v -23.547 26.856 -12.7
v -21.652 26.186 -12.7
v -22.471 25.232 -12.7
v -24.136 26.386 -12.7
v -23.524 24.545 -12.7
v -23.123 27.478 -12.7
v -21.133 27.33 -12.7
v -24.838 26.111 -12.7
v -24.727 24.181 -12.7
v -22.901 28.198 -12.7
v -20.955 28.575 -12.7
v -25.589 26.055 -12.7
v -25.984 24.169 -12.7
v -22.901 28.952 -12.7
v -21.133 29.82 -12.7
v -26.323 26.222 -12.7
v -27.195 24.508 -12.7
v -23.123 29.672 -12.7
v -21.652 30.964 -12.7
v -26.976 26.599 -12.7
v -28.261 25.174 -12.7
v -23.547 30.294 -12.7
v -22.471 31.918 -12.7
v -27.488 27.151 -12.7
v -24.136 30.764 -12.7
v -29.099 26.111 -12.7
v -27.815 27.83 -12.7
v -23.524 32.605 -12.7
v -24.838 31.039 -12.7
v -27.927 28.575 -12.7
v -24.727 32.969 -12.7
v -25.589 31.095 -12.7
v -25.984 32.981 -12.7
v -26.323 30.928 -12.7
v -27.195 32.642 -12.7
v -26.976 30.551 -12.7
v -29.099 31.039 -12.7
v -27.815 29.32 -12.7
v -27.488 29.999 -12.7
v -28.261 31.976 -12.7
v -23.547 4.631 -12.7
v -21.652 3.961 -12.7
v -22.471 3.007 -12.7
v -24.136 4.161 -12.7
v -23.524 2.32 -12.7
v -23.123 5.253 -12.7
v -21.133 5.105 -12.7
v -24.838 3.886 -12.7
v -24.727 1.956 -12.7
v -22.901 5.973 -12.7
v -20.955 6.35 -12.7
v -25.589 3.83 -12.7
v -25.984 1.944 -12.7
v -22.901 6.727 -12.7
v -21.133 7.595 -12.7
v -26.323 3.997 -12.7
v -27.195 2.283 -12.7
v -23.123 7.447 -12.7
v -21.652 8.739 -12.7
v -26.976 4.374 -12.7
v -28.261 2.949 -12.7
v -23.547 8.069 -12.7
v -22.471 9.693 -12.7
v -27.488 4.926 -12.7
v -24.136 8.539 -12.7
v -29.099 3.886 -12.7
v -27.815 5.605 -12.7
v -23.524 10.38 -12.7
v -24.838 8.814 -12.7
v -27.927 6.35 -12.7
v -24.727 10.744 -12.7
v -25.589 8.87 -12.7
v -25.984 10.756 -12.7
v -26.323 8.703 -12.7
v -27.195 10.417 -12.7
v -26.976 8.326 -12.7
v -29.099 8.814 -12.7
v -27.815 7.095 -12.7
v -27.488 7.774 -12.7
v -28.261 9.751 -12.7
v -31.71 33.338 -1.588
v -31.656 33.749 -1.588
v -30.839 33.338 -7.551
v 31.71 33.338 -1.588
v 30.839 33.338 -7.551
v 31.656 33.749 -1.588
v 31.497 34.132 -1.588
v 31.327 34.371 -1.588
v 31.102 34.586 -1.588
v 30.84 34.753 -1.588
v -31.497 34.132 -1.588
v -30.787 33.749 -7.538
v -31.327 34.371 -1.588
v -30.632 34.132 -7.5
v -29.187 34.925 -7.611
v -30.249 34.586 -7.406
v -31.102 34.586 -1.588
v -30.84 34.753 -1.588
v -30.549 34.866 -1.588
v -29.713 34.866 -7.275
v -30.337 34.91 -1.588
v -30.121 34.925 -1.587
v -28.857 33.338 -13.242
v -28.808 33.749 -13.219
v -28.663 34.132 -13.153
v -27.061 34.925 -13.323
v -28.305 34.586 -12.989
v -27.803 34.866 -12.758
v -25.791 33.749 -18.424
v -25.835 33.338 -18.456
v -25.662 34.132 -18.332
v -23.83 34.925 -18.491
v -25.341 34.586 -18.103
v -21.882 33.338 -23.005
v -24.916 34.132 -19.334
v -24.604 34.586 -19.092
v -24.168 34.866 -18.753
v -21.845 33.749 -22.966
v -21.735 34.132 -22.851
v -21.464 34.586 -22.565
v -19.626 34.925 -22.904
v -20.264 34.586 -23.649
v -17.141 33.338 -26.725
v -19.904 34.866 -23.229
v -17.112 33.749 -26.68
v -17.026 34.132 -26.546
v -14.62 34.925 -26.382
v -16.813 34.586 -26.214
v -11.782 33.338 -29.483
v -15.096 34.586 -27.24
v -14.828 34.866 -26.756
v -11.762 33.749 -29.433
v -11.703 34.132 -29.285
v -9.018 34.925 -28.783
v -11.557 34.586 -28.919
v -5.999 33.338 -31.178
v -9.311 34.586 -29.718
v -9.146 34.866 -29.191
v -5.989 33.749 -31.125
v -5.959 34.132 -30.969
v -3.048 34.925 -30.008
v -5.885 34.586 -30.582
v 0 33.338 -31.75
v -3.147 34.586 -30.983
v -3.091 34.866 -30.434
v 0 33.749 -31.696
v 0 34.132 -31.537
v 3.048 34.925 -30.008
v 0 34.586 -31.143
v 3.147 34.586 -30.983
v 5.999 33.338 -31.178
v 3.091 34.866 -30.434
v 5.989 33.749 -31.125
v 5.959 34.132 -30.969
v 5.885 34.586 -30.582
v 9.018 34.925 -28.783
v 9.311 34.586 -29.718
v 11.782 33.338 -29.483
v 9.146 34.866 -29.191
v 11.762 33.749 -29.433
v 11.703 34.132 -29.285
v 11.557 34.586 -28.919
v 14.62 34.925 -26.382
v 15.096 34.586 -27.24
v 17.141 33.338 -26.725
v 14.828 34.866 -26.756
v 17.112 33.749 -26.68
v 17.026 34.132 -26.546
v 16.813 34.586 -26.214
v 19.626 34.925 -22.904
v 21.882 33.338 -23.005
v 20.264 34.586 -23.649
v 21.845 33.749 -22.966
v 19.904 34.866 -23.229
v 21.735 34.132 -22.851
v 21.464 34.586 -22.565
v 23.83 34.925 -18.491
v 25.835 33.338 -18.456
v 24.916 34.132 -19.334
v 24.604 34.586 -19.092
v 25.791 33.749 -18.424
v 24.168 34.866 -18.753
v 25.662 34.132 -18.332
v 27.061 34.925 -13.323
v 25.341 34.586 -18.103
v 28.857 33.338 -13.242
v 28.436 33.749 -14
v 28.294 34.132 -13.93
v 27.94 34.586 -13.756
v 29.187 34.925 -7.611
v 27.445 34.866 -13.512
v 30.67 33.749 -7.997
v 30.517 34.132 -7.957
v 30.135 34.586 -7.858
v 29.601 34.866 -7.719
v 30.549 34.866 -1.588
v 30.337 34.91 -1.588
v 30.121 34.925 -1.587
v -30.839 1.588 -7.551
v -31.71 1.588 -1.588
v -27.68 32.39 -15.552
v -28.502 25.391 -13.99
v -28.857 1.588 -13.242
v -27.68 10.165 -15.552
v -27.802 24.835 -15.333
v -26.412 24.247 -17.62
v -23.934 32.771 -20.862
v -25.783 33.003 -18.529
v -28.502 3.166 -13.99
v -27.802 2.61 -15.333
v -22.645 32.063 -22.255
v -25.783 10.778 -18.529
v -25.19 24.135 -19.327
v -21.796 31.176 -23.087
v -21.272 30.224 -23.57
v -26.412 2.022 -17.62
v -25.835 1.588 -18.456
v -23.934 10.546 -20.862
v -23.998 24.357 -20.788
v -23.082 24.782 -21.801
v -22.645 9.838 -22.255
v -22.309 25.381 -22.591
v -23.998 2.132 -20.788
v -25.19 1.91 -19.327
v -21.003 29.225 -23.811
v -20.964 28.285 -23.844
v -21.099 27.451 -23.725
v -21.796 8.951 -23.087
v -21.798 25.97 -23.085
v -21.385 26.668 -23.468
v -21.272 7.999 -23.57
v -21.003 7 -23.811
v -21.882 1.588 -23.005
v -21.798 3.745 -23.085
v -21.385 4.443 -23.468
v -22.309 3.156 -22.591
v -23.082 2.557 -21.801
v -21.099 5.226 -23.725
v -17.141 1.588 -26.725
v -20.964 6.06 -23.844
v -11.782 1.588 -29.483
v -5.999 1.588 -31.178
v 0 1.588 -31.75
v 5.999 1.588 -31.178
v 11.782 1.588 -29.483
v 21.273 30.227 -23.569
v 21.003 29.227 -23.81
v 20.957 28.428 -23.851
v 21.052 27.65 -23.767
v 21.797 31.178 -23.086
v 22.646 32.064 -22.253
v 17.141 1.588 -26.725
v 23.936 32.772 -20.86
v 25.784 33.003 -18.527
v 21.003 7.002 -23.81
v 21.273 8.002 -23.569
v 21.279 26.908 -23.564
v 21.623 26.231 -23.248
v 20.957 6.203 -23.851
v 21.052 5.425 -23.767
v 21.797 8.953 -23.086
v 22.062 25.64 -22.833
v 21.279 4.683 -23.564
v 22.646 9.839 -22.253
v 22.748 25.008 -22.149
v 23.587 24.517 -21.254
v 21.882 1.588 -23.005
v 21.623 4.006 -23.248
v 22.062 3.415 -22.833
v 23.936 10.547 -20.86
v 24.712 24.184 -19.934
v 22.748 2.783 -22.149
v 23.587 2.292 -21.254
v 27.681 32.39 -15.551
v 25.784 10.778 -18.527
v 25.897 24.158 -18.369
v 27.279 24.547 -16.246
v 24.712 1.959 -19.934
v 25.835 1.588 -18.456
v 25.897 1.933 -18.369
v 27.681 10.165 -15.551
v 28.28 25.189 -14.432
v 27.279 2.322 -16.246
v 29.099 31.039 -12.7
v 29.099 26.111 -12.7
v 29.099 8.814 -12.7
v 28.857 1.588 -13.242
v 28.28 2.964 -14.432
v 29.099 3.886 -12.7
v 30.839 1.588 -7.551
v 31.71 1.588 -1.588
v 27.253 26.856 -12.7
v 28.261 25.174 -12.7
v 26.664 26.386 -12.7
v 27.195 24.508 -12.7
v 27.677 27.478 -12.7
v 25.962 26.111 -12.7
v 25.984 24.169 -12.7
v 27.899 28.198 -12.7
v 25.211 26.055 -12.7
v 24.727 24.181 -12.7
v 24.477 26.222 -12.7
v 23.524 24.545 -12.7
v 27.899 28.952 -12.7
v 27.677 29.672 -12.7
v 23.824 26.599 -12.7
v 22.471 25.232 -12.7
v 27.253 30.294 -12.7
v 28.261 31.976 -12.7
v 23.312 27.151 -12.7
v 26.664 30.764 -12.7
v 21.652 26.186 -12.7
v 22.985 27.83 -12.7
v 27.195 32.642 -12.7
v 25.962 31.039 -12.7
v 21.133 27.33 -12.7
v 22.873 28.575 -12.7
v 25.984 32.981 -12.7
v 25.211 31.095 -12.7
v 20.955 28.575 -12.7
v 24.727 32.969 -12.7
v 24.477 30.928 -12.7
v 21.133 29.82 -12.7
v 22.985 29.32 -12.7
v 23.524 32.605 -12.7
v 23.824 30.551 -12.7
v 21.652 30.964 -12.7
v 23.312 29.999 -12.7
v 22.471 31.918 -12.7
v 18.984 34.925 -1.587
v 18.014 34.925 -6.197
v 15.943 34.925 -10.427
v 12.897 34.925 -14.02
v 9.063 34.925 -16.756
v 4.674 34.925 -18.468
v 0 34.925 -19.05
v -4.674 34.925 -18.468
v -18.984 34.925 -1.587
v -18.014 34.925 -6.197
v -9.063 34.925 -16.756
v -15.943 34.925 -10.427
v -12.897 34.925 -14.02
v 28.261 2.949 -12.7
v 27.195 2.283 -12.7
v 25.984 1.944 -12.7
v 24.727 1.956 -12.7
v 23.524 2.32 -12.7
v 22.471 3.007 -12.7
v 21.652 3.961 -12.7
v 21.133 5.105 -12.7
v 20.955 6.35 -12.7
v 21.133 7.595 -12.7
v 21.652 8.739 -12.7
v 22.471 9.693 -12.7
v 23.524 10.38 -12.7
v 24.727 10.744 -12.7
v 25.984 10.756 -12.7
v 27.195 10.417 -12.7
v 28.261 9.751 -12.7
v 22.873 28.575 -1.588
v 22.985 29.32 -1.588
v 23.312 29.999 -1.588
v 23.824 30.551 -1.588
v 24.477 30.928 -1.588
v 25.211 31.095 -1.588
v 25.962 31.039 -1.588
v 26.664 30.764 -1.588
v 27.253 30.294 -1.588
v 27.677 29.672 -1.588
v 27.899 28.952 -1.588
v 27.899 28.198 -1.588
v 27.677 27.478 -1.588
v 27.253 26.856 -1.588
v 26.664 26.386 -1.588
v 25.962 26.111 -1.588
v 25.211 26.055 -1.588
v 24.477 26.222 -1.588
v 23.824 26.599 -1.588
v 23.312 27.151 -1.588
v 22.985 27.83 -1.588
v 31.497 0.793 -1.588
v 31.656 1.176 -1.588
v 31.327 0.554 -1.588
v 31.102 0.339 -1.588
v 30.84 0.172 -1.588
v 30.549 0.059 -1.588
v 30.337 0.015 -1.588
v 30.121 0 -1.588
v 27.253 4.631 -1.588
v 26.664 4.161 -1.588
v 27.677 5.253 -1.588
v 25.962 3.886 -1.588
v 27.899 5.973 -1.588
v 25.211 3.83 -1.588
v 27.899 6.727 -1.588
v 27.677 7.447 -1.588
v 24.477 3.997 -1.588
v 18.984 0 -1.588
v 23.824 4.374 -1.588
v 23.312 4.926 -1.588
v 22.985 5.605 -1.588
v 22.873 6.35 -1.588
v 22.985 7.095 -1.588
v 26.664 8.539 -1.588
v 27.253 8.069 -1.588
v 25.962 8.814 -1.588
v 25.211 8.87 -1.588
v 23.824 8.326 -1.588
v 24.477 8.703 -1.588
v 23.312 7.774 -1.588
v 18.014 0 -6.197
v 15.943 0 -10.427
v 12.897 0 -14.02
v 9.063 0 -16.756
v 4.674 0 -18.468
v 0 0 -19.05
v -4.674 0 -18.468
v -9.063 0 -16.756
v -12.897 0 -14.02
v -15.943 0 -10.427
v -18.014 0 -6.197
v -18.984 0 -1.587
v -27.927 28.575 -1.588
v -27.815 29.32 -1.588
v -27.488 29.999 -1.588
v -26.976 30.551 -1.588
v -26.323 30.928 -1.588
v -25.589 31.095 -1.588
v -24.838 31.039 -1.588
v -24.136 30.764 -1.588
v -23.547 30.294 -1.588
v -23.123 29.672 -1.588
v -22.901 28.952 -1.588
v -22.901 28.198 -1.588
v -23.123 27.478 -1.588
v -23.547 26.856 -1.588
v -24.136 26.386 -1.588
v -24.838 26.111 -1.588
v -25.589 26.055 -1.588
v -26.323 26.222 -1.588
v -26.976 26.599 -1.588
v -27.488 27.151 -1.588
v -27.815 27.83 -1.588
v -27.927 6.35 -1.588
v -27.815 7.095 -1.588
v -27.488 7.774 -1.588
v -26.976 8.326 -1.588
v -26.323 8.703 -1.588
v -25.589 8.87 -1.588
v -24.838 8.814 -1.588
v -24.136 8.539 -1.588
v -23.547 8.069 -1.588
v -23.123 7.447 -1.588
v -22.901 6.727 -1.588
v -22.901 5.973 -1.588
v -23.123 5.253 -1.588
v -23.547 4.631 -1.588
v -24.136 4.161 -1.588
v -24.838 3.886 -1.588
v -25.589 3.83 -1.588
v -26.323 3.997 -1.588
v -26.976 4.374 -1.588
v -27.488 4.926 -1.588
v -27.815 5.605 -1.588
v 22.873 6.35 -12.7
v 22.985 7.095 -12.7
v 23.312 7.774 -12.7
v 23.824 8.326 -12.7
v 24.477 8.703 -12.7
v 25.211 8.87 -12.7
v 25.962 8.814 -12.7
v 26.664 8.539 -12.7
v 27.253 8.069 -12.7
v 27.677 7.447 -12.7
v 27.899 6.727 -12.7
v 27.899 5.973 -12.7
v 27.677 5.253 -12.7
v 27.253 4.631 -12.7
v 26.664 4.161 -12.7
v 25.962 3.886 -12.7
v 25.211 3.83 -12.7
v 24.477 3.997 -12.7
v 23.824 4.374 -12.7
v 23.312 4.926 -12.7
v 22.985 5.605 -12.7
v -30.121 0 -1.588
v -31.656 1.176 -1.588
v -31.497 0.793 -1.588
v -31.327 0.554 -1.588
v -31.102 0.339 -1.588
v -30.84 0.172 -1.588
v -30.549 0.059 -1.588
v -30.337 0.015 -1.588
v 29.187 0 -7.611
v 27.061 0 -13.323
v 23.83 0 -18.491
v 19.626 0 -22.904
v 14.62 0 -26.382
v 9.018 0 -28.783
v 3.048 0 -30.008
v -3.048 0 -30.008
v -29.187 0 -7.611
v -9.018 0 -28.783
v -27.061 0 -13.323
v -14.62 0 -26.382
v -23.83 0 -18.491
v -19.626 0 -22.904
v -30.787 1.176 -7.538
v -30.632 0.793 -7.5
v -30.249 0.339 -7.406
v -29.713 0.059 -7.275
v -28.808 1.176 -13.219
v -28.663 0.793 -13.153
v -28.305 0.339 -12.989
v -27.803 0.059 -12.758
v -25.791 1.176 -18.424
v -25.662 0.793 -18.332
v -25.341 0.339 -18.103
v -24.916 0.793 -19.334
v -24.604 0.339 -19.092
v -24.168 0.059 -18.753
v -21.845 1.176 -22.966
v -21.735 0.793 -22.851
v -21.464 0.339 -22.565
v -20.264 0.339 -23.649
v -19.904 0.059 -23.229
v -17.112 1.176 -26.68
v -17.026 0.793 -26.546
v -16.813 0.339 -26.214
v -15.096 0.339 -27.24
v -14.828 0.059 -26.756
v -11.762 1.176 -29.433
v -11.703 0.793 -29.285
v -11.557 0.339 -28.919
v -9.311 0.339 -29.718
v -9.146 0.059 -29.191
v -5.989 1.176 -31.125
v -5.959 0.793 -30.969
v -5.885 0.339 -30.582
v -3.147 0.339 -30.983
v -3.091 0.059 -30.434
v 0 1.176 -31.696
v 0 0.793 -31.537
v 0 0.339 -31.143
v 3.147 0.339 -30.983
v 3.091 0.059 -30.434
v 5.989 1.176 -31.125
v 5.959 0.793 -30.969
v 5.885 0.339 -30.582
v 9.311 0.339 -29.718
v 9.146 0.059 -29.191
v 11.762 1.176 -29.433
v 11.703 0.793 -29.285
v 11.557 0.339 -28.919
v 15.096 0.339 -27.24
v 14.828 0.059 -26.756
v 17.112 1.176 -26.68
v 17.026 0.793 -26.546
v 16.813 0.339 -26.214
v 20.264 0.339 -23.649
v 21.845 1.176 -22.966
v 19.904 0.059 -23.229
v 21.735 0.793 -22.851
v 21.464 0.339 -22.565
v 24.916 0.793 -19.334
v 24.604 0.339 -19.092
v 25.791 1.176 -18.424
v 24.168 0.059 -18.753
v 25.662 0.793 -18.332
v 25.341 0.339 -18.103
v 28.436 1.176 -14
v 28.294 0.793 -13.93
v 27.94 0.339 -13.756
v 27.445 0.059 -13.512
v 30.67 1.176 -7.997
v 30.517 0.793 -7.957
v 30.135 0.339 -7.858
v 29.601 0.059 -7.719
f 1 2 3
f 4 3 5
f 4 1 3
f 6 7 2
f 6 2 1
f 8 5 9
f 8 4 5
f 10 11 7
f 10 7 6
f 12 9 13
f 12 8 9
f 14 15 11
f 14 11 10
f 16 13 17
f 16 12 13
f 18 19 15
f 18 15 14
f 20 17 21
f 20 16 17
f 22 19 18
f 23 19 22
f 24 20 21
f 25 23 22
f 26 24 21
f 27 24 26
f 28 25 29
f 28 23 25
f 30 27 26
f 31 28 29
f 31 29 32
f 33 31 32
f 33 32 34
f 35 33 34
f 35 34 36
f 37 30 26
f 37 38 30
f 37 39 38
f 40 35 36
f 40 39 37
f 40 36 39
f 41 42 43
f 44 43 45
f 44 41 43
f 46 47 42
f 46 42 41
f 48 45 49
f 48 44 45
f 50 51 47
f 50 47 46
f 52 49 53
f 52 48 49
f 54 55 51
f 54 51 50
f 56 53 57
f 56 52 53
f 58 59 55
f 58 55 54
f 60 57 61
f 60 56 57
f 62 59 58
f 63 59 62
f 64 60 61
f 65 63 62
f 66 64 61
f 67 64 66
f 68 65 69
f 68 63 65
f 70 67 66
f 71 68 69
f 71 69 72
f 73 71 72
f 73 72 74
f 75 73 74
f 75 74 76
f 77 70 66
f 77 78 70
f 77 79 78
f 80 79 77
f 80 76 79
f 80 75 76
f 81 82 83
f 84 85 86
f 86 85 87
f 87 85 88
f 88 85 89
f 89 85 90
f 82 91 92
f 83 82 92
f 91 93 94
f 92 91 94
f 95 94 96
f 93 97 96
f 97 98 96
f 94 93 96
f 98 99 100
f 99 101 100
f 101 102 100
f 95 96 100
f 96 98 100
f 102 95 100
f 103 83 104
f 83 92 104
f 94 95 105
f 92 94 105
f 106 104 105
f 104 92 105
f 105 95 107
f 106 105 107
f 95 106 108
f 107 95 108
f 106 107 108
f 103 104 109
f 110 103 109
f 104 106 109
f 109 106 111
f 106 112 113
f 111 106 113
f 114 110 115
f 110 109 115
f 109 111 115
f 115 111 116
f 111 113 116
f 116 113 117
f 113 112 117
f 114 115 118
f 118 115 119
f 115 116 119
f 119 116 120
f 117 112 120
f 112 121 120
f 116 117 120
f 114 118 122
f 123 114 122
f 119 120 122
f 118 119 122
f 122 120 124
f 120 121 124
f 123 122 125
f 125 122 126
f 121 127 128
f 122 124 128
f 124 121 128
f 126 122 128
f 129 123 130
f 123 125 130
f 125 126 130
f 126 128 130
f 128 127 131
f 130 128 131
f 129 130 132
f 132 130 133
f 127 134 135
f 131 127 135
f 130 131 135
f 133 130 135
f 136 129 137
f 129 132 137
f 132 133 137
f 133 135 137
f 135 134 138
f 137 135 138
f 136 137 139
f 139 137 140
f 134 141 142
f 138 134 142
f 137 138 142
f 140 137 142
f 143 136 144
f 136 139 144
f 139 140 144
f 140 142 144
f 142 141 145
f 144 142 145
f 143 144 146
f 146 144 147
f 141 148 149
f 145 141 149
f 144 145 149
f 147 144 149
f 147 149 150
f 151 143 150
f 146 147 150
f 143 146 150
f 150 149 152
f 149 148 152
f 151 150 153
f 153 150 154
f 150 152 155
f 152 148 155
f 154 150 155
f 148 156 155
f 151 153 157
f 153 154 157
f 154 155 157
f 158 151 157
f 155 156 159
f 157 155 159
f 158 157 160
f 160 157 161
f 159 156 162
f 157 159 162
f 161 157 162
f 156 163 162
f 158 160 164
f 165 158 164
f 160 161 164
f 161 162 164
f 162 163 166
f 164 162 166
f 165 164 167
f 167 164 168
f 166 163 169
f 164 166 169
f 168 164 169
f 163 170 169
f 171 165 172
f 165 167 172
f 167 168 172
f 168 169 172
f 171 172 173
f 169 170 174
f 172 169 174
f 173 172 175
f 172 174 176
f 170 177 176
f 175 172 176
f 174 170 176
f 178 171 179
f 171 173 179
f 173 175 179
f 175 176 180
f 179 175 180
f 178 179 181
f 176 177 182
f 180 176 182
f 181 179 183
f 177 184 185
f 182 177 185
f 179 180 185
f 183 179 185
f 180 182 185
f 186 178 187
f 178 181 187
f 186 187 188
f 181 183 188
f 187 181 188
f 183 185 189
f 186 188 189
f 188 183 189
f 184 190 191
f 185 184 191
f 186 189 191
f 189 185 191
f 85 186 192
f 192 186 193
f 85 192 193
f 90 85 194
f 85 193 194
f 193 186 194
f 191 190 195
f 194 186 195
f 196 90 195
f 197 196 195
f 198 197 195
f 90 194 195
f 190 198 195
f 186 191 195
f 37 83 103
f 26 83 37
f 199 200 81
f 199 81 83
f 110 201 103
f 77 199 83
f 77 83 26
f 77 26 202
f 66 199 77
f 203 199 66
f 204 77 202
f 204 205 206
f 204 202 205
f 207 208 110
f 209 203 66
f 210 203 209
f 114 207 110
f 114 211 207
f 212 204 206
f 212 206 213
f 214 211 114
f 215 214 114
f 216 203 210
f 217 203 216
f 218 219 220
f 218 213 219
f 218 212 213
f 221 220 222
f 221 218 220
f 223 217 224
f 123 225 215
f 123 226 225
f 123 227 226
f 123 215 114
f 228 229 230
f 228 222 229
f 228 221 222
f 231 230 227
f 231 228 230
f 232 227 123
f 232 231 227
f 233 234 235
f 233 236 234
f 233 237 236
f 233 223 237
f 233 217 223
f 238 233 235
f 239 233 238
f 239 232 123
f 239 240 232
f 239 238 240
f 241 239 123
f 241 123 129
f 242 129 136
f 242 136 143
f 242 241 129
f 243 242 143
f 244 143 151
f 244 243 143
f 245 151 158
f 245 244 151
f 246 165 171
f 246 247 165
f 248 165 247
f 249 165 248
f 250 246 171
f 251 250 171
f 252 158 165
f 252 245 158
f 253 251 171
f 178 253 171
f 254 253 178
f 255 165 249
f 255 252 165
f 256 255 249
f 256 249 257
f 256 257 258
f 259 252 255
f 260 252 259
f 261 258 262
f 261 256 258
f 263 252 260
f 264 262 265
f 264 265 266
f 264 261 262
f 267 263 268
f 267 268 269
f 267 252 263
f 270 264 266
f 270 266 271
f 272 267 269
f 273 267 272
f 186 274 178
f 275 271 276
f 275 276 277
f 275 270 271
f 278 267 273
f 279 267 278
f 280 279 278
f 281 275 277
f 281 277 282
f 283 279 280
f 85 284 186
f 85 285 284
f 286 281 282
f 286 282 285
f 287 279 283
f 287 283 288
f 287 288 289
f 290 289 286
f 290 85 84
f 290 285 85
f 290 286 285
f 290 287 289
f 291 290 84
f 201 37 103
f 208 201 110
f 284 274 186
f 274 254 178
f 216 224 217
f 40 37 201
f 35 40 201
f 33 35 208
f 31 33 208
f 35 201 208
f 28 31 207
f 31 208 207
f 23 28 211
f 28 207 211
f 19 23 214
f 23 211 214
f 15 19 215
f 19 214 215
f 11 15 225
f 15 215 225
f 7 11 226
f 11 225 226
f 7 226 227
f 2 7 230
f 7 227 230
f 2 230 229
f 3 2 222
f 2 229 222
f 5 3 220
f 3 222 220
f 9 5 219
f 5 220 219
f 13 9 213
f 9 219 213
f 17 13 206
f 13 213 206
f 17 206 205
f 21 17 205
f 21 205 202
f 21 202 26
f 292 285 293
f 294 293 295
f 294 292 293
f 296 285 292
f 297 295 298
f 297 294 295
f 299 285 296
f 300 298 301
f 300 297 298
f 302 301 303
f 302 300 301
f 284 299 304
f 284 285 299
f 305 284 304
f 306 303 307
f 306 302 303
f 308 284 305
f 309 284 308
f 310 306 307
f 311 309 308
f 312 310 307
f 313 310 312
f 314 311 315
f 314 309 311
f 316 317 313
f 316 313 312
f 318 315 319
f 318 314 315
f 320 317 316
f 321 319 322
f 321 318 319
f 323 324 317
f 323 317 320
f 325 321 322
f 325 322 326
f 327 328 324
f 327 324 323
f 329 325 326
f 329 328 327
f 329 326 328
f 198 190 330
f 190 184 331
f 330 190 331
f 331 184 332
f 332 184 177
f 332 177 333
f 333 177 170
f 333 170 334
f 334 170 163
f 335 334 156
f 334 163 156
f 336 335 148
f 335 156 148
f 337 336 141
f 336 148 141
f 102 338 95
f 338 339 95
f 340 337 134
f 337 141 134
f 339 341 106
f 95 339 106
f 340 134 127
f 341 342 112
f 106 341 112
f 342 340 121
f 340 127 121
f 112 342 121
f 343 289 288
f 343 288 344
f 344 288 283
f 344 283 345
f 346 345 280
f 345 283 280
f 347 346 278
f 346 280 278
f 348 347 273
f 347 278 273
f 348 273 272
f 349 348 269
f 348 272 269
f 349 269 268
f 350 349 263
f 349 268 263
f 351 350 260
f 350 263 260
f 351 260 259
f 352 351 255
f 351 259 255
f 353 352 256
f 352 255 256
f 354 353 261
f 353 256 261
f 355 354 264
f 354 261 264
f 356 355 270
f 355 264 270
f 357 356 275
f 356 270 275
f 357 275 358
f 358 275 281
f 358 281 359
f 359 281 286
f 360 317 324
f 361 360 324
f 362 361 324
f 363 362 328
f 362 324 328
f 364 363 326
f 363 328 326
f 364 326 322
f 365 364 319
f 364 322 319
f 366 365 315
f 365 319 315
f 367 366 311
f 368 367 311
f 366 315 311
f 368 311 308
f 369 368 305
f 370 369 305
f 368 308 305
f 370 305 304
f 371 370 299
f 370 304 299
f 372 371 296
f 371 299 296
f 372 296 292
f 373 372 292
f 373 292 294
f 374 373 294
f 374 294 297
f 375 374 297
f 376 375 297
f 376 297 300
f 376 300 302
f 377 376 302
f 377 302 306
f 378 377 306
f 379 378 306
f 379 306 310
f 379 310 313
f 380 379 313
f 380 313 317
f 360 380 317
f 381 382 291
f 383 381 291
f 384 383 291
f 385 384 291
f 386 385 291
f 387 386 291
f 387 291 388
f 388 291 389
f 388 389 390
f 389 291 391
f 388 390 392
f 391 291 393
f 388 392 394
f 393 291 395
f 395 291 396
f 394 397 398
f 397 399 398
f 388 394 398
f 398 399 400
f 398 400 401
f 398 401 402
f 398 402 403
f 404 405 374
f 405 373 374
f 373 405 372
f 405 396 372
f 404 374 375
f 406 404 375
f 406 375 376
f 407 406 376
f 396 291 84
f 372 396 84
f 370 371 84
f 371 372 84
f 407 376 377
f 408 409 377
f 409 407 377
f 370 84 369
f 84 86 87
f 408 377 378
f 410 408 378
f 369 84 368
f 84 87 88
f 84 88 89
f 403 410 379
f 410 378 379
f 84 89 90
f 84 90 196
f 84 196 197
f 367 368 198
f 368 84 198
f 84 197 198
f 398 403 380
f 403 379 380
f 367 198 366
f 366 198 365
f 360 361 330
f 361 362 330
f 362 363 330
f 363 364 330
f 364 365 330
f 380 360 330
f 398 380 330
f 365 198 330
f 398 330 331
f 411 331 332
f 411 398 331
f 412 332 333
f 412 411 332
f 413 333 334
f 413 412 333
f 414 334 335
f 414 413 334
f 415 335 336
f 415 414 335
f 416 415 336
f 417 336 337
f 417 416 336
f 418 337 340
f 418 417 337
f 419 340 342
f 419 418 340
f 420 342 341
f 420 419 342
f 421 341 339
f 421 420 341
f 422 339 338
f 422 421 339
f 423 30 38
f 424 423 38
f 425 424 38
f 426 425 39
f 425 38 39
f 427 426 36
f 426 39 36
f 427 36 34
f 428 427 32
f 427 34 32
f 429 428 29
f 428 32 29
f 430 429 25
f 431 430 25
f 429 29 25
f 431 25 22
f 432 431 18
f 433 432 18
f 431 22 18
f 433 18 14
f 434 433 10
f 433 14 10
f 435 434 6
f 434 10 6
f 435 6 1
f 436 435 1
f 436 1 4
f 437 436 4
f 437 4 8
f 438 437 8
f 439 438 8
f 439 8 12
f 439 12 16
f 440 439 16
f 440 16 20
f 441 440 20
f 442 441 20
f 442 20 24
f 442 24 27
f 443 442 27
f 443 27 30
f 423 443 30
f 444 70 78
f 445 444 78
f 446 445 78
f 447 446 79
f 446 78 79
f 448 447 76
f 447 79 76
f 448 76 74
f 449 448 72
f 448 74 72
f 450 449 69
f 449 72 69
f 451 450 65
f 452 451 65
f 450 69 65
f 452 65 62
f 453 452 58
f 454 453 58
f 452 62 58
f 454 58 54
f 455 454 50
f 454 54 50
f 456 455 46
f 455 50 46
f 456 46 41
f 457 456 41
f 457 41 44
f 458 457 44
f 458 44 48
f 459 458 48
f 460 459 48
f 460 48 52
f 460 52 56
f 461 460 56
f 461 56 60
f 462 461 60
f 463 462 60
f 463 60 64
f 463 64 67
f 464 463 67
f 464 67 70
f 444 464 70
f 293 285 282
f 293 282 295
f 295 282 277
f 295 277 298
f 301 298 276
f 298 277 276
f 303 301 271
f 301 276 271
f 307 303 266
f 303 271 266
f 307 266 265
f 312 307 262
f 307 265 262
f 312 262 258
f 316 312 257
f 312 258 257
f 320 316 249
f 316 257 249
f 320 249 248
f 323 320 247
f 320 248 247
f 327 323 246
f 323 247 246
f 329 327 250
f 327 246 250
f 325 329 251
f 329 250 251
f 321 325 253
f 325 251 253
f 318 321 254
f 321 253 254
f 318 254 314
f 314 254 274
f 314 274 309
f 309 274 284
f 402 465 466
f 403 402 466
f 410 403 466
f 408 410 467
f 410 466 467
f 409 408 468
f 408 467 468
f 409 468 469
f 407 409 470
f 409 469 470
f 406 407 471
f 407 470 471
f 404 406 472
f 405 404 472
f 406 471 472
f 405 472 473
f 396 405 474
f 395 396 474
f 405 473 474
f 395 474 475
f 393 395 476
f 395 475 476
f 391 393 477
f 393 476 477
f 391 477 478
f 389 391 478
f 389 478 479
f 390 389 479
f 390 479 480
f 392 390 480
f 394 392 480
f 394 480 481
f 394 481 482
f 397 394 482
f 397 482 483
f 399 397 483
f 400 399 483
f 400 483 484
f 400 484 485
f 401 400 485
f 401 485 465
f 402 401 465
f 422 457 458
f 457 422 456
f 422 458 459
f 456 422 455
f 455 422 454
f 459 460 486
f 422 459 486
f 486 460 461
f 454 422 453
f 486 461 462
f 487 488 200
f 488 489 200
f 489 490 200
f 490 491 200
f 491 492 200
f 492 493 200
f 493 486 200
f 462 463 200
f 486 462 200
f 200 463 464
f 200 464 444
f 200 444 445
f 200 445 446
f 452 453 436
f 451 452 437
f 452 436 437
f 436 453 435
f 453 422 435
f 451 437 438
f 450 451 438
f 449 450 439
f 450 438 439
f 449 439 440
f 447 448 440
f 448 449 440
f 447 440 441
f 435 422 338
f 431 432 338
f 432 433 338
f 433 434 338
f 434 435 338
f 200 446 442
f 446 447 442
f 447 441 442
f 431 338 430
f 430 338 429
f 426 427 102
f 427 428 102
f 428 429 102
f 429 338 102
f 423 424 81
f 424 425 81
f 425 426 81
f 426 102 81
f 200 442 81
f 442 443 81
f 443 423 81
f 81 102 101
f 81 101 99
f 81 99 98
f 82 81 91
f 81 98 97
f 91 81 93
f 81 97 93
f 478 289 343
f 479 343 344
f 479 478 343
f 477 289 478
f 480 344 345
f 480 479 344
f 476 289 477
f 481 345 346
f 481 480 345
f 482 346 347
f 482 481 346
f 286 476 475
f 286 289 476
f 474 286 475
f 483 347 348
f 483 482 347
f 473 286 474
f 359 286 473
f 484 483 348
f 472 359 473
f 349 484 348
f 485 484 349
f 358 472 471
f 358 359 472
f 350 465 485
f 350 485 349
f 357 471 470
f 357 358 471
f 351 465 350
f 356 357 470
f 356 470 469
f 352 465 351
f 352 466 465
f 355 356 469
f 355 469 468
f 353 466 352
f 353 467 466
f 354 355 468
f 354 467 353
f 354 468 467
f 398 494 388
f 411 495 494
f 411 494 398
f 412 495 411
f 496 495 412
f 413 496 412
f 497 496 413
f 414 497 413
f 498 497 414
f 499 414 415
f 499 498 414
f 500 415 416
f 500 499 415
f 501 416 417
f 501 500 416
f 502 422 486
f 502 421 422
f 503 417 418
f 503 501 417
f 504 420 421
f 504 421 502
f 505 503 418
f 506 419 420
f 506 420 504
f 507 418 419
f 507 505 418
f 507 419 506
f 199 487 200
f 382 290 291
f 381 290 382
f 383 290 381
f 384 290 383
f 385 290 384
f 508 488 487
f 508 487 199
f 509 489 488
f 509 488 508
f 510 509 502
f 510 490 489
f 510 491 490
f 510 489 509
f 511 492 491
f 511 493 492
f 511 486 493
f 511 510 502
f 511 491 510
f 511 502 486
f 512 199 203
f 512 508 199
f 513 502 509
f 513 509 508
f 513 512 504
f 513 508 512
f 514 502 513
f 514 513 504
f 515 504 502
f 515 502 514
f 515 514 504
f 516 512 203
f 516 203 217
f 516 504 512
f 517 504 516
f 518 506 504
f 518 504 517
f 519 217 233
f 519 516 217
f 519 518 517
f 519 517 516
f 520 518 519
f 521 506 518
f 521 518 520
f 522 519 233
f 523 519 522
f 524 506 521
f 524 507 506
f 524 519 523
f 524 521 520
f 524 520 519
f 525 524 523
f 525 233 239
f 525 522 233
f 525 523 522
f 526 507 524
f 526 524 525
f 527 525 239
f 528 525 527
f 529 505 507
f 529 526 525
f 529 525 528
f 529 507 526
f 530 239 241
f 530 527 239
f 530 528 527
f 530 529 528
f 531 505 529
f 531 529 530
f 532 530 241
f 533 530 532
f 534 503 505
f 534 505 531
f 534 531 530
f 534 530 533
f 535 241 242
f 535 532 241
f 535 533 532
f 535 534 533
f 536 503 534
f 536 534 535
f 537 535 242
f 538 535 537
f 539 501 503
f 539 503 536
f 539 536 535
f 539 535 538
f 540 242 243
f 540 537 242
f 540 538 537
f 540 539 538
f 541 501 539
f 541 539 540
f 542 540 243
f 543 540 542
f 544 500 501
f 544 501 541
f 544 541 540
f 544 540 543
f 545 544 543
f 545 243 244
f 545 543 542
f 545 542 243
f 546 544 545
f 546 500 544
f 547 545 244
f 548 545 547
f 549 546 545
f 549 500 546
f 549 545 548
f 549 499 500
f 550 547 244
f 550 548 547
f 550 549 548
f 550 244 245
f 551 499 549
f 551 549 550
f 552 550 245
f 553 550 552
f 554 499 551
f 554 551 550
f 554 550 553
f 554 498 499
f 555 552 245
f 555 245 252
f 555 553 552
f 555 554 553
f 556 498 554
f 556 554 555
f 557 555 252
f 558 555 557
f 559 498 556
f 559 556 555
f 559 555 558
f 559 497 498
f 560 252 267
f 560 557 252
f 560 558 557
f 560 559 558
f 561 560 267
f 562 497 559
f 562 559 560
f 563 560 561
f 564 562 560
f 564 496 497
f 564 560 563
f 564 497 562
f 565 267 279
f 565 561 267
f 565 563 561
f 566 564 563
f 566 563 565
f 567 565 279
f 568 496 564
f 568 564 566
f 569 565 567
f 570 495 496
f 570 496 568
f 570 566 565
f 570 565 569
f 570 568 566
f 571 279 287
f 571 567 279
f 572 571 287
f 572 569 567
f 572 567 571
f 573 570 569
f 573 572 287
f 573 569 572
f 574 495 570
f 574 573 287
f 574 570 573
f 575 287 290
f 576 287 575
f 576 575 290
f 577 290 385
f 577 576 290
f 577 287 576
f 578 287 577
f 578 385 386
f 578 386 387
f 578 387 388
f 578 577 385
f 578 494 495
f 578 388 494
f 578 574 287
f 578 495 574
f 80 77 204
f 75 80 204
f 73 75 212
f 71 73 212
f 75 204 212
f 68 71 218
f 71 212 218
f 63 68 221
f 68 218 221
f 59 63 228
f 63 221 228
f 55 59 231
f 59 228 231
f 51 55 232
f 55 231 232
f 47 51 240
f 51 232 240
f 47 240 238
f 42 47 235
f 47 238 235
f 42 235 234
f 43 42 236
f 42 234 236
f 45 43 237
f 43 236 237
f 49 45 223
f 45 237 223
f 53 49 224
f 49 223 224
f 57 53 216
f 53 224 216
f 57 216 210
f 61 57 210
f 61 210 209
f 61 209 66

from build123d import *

# Parameters (mm, degrees)
BOSS_EXTRUDE1_DEPTH        = 34.925
F_8_0_199_DIAMETER_HOLE1_D = 5.0546
LPATTERN1_COUNT            = 2
LPATTERN1_PITCH            = 50.8
LPATTERN1_COUNT_DIR2       = 2
LPATTERN1_PITCH_DIR2       = 22.225
SKETCH5_R                  = 4.445
CUT_EXTRUDE1_DEPTH         = 19.05
LPATTERN2_COUNT            = 2
LPATTERN2_PITCH            = 50.8
LPATTERN2_COUNT_DIR2       = 2
LPATTERN2_PITCH_DIR2       = 22.225
FILLET1_R                  = 1.5875
SKETCH6_W                  = 63.605048243
SKETCH6_H                  = 35.055385684
CUT_EXTRUDE3_DEPTH         = 1.5875


with BuildPart() as part:
    # Sketch1 → Boss-Extrude1 (new body)
    with BuildSketch(Plane(origin=(0, 0, 0), x_dir=(1, 0, 0), z_dir=(0, 1, 0))):
        with BuildLine():
            Line((-19.05, 0), (-31.75, 0))
            ThreePointArc((-31.75, 0), (0, 31.75), (31.75, 0))
            Line((31.75, 0), (19.05, 0))
            ThreePointArc((19.05, 0), (0, 19.05), (-19.05, 0))
        make_face()
    extrude(amount=BOSS_EXTRUDE1_DEPTH)

    # #8 (0.199) Diameter Hole1 (through all)
    with Locations(Plane.XY):
        with Locations((-25.4, 28.575)):
            f_8_0_199_diameter_hole1 = Hole(F_8_0_199_DIAMETER_HOLE1_D / 2)

    # LPattern1: 8 _0.199_ Diameter Hole1 2 × 2
    with Locations(*[(i * LPATTERN1_PITCH, -j * LPATTERN1_PITCH_DIR2, 0) for i in range(LPATTERN1_COUNT) for j in range(LPATTERN1_COUNT_DIR2) if (i, j) != (0, 0)]):
        add(f_8_0_199_diameter_hole1, mode=Mode.SUBTRACT)

    # Sketch5 → Cut-Extrude1 (cut)
    with BuildSketch(Plane(origin=(0, 0, -31.75), x_dir=(-1, 0, 0), z_dir=(0, 0, -1))):
        with Locations((-25.4, 28.575)):
            Circle(SKETCH5_R)
    cut_extrude1 = extrude(amount=-CUT_EXTRUDE1_DEPTH, mode=Mode.SUBTRACT)

    # LPattern2: Cut-Extrude1 2 × 2
    with Locations(*[(-i * LPATTERN2_PITCH, -j * LPATTERN2_PITCH_DIR2, 0) for i in range(LPATTERN2_COUNT) for j in range(LPATTERN2_COUNT_DIR2) if (i, j) != (0, 0)]):
        add(cut_extrude1, mode=Mode.SUBTRACT)

    # Fillet1
    fillet1_edges = [part.edges().sort_by_distance(p)[0] for p in [
        (0, 34.925, -31.75),
        (0, 0, -31.75),
    ]]
    fillet(fillet1_edges, radius=FILLET1_R)

    # Sketch6 → Cut-Extrude3 (cut)
    with BuildSketch(Plane(origin=(0, 0, 0), x_dir=(-1, 0, 0), z_dir=(0, 0, -1))):
        with Locations((0.052524121, 17.397307158)):
            Rectangle(SKETCH6_W, SKETCH6_H)
    extrude(amount=CUT_EXTRUDE3_DEPTH, mode=Mode.SUBTRACT)


solid = part.part
